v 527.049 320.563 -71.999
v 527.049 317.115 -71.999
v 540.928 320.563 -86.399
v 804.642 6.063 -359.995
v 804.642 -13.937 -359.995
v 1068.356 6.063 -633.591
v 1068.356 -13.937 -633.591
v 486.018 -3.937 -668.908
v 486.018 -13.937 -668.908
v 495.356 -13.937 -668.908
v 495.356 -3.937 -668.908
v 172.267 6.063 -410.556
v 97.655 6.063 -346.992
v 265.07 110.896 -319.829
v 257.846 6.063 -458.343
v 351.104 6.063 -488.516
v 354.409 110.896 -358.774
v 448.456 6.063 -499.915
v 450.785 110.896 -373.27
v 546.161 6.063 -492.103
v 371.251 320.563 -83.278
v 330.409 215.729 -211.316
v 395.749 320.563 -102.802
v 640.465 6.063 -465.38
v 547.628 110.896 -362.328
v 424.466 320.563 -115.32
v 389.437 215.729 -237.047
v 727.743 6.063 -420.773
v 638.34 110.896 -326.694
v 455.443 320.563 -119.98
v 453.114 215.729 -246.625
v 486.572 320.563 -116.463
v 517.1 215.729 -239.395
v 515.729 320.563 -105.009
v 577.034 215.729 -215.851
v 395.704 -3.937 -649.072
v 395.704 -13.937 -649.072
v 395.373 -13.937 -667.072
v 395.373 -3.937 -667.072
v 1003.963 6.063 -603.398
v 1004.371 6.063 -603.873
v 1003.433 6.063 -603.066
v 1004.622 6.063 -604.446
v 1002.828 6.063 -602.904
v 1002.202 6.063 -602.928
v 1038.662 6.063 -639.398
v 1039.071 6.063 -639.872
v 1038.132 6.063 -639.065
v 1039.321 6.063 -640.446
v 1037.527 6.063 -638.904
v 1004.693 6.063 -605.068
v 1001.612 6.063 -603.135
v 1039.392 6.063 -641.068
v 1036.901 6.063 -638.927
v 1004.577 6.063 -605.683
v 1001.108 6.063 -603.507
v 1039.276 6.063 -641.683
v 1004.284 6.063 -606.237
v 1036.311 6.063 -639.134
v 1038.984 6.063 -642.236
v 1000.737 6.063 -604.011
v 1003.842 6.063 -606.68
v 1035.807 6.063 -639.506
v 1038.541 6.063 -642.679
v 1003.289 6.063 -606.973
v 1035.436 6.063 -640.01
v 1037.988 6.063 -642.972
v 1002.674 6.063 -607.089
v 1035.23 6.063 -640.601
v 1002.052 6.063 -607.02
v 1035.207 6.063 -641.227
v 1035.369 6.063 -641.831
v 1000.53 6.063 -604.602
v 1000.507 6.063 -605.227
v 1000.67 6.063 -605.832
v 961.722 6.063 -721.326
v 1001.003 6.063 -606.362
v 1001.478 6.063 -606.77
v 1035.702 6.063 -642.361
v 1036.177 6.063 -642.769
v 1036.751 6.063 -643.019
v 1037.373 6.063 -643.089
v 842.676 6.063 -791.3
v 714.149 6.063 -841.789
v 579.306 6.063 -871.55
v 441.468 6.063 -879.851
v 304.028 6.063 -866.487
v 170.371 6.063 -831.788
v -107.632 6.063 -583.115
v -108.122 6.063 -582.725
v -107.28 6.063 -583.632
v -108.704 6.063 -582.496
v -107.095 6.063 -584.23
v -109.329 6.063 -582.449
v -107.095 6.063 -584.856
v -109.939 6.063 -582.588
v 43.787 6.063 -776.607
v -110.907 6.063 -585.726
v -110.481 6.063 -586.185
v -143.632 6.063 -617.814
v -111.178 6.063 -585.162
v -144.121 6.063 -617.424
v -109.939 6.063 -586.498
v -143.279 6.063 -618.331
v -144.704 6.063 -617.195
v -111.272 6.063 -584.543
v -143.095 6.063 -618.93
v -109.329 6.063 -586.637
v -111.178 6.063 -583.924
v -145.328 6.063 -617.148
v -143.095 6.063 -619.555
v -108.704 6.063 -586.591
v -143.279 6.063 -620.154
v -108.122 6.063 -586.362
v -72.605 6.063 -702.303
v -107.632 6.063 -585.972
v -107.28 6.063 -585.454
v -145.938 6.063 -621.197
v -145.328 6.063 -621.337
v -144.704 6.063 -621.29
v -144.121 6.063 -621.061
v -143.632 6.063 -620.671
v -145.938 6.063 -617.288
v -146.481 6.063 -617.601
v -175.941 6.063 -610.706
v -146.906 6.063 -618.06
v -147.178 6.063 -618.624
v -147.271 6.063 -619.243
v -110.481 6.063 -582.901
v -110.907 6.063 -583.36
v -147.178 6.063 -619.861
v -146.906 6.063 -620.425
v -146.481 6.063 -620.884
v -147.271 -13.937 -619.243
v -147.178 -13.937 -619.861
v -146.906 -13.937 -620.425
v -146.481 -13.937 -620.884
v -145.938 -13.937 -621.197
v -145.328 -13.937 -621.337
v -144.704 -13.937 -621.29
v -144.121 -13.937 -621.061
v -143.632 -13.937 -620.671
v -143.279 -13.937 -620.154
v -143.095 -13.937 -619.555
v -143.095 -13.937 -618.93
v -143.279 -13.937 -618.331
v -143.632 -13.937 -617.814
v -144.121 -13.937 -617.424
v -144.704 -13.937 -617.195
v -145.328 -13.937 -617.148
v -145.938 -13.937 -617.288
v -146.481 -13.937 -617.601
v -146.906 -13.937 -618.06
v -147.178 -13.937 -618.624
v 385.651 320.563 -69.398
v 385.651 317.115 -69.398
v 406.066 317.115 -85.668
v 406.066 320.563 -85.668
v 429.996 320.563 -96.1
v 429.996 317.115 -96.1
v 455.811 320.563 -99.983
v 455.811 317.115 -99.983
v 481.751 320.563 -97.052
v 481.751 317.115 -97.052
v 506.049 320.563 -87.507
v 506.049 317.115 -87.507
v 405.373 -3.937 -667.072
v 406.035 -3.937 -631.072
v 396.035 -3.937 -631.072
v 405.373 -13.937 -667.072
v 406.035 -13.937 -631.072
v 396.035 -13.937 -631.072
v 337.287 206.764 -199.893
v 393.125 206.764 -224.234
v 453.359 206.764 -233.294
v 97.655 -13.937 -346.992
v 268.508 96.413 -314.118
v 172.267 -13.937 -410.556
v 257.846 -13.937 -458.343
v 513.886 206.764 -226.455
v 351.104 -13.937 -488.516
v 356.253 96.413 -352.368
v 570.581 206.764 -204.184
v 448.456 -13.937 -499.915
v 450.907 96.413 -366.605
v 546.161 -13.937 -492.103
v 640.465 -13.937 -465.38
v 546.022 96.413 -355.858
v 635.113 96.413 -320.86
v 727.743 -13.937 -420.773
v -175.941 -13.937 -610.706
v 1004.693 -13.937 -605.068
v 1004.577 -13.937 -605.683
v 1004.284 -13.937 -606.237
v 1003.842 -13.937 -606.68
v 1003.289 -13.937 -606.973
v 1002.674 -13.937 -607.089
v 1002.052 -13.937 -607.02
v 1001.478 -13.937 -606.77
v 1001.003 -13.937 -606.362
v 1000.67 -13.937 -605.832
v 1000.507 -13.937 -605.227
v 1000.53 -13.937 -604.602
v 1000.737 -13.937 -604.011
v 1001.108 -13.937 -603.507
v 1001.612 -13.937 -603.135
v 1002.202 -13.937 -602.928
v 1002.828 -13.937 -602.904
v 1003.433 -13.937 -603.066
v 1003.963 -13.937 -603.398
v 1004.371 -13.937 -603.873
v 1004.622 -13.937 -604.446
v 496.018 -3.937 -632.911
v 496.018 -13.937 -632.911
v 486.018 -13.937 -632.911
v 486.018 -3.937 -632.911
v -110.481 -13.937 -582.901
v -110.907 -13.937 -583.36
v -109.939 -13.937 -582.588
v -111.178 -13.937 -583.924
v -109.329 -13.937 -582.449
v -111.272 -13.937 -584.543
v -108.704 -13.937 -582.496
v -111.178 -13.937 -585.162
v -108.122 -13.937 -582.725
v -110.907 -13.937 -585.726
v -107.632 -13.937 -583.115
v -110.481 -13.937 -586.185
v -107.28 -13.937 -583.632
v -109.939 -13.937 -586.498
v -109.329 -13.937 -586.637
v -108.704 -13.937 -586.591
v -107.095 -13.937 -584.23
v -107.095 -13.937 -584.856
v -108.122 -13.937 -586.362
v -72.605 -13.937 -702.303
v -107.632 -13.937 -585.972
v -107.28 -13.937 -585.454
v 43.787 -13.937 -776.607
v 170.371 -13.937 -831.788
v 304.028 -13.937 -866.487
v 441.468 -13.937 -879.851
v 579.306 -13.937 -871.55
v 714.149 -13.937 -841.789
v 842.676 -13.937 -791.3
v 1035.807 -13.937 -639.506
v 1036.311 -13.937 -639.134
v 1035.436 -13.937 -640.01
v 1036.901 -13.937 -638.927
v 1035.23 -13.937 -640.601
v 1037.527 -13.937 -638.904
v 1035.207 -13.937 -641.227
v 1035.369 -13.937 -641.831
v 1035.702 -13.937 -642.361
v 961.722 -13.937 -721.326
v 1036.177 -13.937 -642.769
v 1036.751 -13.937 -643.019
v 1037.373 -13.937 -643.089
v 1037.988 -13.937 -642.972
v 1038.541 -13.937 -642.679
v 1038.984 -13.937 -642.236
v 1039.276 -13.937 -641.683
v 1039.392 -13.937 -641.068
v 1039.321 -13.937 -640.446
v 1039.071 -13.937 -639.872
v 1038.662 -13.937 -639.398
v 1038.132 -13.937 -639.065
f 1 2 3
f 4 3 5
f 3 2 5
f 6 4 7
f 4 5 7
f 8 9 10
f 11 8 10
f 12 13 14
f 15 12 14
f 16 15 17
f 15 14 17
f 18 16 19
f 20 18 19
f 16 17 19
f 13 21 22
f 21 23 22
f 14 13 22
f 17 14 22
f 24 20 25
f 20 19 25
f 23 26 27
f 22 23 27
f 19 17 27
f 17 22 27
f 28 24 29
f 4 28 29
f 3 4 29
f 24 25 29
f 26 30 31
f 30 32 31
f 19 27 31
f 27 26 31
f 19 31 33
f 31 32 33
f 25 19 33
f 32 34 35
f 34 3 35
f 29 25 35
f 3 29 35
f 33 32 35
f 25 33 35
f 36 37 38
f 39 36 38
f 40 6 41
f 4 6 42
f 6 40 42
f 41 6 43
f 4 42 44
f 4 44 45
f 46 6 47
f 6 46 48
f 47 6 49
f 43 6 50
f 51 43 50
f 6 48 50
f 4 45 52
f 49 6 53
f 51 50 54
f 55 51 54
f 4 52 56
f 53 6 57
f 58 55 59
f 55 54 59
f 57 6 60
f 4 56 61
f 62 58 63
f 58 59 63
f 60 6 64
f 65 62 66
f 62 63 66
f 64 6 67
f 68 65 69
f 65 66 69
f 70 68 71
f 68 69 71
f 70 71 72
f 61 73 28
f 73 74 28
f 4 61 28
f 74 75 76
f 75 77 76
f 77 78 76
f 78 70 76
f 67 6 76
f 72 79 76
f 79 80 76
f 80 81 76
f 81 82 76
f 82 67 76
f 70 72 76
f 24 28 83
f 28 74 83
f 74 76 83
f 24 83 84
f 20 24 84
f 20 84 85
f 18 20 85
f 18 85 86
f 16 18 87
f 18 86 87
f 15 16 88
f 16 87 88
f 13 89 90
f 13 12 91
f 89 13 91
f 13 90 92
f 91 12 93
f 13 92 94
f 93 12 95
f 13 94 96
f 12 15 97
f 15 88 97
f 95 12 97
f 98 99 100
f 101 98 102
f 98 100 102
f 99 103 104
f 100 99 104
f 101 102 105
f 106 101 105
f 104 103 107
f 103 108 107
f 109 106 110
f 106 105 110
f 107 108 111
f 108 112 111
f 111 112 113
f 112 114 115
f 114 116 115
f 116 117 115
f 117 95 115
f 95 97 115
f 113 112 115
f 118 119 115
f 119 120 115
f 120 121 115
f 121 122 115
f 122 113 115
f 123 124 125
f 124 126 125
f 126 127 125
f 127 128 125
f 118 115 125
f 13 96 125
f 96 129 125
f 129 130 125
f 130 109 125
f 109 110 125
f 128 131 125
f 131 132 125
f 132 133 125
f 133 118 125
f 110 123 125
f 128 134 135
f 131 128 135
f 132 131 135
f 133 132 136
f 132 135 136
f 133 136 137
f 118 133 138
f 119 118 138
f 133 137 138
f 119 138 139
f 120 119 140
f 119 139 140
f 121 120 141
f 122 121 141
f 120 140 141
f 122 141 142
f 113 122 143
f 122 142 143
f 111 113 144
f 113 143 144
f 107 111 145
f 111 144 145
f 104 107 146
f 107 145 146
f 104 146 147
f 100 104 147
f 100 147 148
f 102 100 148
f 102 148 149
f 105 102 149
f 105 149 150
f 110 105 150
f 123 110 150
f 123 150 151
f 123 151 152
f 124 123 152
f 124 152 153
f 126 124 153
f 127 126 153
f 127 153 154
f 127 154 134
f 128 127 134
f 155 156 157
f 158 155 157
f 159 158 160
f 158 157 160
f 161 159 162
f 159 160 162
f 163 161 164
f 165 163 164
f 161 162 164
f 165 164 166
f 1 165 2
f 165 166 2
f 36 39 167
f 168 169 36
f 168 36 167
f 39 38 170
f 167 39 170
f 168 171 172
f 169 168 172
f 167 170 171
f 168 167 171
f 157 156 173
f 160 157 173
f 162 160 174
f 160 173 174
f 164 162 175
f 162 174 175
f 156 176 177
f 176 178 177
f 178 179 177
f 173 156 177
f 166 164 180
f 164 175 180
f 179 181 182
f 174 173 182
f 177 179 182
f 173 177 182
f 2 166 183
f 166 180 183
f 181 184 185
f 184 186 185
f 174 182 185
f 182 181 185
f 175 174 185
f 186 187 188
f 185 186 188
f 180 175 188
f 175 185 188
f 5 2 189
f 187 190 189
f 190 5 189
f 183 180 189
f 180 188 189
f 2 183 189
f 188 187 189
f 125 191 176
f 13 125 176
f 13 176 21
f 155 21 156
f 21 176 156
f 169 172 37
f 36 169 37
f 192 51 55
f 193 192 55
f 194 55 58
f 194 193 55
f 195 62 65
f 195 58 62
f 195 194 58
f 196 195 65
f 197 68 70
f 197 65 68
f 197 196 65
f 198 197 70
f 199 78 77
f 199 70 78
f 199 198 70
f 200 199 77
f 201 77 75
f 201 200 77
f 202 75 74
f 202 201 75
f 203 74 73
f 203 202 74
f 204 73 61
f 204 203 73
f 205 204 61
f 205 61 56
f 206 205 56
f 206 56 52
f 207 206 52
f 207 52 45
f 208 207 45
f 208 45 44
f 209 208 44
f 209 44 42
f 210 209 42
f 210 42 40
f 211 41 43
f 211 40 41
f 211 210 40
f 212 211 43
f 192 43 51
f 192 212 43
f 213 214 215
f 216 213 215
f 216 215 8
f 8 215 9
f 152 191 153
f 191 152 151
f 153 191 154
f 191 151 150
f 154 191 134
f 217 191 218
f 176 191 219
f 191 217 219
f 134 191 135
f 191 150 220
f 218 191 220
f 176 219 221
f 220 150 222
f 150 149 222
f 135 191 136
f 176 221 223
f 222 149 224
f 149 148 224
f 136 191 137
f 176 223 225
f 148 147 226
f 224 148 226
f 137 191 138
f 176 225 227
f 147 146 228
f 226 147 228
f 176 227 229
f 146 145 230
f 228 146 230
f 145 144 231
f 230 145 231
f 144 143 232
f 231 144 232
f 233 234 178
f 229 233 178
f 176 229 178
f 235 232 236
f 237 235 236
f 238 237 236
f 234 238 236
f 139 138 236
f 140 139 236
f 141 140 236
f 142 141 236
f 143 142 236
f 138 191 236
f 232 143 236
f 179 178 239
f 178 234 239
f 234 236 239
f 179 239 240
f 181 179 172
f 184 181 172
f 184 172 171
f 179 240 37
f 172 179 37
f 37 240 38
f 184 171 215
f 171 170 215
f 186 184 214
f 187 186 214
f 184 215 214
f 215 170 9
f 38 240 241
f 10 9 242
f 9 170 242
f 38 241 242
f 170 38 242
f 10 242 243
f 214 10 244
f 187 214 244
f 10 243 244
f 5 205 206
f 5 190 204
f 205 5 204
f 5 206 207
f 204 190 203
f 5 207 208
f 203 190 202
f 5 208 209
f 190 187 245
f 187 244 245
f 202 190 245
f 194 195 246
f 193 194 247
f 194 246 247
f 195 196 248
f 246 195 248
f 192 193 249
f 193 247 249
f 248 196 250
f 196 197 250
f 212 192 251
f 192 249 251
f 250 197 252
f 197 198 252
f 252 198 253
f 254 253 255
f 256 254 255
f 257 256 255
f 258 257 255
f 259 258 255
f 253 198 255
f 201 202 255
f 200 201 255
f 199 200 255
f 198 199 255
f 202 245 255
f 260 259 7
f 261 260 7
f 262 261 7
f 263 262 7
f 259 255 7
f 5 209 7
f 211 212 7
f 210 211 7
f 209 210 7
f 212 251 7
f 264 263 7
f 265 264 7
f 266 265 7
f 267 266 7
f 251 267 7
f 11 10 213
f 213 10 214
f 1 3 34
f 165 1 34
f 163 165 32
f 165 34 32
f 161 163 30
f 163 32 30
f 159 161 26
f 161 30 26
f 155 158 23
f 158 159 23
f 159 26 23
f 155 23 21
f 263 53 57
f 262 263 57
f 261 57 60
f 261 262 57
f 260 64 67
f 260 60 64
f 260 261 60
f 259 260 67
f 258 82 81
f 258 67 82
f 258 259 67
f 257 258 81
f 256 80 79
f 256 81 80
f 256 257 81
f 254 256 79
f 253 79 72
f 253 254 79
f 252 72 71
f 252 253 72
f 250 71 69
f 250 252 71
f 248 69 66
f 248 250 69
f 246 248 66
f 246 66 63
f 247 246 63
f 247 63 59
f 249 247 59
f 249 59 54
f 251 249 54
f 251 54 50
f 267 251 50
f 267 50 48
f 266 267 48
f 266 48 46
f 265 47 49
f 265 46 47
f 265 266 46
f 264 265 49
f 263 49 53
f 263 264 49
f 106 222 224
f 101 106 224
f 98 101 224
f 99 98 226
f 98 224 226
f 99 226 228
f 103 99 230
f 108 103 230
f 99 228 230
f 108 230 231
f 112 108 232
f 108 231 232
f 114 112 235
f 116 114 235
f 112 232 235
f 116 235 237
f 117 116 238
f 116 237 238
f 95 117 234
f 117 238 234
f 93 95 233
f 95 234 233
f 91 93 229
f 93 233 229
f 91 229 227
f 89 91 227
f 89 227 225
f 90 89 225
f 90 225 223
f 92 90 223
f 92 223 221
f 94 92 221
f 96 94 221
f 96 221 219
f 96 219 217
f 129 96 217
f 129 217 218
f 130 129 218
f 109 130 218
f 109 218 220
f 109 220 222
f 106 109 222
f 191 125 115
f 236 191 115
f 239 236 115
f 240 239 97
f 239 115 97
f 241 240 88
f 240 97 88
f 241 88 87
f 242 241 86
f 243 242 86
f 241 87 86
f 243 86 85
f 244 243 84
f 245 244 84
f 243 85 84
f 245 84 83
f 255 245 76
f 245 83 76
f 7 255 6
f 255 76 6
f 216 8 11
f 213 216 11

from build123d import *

# Parameters (mm, degrees)
CUT_EXTRUDE_1_DEPTH      = 1636.725546456
CUT_EXTRUDE_1_DEPTH_BACK = 1636.725546456
SKETCH_3_OUTSIDE_W       = 2264.278
SKETCH_3_OUTSIDE_H       = 2264.278
CUT_EXTRUDE_5_DEPTH      = 10
HOLE_WIZARD_M5_1_D       = 4.2


with BuildPart() as part:
    # 草图2 → 旋转1 (revolve)
    with BuildSketch(Plane.XY):
        Polygon((-422.349891291, 6.062538723), (-42.349891291, 6.062538723), (337.650108709, 320.562538723), (357.650108709, 320.562538723), (357.650108709, 317.115170302), (-42.349891291, -13.937461277), (-422.349891291, -13.937461277), align=None)
    revolve(axis=Axis((457.650108709, 481.315085819, 0), (0, -1, 0)))

    # 草图3 outside → 切除-拉伸1 (cut, two sides: drawn at the far end of the back side and taken through both)
    with BuildSketch(Plane(origin=(0, 320.562538723, 0), x_dir=(1, 0, 0), z_dir=(0, 1, 0)).offset(-CUT_EXTRUDE_1_DEPTH_BACK)):
        with Locations((457.65, 0)):
            Rectangle(SKETCH_3_OUTSIDE_W, SKETCH_3_OUTSIDE_H)
        Polygon((457.650108709, 0), (1205.950605112, 776.341843522), (29.226896752, 1910.562473831), (-719.073599651, 1134.220630309), align=None, mode=Mode.SUBTRACT)
    extrude(amount=CUT_EXTRUDE_1_DEPTH + CUT_EXTRUDE_1_DEPTH_BACK, mode=Mode.SUBTRACT)

    # 草图7 → 切除-拉伸5 (cut)
    with BuildSketch(Plane.XZ.offset(13.937461277)):
        Polygon((395.372807922, -667.072096819), (405.372807922, -667.072096819), (406.034922879, -631.072096819), (396.034922879, -631.072096819), (395.7038654, -649.072096819), align=None)
        Polygon((495.686956256, -650.910994037), (496.018013734, -632.910994037), (486.018013734, -632.910994037), (486.018013734, -668.907950391), (495.355954757, -668.907950391), align=None)
    extrude(amount=-CUT_EXTRUDE_5_DEPTH, mode=Mode.SUBTRACT)

    # M5 螺纹孔1 (through all)
    with Locations(Plane(origin=(-145.171244311, 6.062538723, -619.24250439), x_dir=(1, 0, 0), z_dir=(0, 1, 0))):
        with Locations((0, 0), (35.99950912, -34.699212428)):
            hole_wizard_m5_1 = Hole(HOLE_WIZARD_M5_1_D / 2)

    # 镜向1: M5 螺纹孔1 across plane
    add(hole_wizard_m5_1.mirror(Plane(origin=(457.495352358, 0, -8.41429209), x_dir=(0.018388972176112385, 0, 0.9998309085551947), z_dir=(-0.9998309085551947, 0, 0.018388972176112385))), mode=Mode.SUBTRACT)


solid = part.part
